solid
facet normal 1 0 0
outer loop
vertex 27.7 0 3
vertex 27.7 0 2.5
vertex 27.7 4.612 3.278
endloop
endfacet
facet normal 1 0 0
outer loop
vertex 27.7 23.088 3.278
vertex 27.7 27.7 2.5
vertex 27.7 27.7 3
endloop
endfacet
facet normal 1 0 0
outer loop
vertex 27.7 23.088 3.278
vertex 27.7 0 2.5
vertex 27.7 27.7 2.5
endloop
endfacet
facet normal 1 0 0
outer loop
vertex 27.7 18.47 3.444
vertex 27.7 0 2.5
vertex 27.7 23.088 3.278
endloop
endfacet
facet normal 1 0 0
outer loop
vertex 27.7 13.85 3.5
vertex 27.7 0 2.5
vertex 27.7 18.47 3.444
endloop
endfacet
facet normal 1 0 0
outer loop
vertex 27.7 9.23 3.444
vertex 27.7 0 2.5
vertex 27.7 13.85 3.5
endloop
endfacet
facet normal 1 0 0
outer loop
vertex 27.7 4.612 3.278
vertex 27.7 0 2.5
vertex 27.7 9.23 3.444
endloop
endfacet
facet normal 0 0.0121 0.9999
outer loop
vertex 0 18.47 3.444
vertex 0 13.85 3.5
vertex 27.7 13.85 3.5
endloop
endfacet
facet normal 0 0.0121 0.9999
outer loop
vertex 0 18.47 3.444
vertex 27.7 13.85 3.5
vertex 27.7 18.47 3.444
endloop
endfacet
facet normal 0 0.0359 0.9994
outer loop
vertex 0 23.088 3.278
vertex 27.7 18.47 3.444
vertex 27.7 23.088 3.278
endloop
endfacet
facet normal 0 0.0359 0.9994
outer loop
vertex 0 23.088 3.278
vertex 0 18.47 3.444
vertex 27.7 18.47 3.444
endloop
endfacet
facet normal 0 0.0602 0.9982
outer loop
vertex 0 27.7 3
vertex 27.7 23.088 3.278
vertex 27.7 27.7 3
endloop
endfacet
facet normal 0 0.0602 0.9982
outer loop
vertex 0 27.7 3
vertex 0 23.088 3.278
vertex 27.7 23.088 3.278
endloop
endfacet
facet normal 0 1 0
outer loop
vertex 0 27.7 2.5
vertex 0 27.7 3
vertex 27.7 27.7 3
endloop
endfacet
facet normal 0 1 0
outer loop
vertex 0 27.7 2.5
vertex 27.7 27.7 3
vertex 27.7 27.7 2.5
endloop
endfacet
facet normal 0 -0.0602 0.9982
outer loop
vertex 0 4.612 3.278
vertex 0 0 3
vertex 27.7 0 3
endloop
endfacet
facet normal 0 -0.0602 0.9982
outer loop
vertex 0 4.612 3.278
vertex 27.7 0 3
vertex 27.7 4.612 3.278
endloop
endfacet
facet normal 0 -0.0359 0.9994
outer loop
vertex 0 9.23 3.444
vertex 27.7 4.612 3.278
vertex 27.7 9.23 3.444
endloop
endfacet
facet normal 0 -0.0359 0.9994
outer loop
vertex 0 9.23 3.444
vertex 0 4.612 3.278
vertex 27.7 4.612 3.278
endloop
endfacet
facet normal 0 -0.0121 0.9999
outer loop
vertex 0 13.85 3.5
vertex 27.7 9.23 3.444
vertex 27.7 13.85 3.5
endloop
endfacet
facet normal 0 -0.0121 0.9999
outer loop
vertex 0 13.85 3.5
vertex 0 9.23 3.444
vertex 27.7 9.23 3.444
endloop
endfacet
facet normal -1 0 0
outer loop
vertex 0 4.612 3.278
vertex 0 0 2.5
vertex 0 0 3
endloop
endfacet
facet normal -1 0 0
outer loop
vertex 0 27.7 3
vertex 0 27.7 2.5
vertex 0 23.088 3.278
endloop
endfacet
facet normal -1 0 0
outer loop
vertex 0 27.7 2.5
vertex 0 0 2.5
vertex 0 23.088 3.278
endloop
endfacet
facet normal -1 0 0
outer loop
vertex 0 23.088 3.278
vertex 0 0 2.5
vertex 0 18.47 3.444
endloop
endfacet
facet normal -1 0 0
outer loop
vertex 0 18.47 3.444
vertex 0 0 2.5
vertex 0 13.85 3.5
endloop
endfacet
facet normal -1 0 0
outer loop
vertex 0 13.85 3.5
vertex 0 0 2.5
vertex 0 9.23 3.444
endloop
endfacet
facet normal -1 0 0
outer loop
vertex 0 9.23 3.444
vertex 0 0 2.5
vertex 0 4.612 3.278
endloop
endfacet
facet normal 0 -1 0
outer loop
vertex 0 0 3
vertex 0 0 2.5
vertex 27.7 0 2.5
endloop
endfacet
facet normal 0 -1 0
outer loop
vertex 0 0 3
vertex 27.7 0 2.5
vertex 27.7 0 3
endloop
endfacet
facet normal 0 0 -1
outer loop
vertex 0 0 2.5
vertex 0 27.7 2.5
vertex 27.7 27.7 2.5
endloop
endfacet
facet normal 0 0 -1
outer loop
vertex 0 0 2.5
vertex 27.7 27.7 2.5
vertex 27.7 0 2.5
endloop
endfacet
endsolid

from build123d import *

# Parameters (mm, degrees)
BOSS_EXTRUDE7_DEPTH = 27.7


with BuildPart() as part:
    # Sketch14 → Boss-Extrude7 (new body)
    with BuildSketch(Plane(origin=(0, 0, 0), x_dir=(0, 0, -1), z_dir=(1, 0, 0))):
        with BuildLine():
            Line((-2.5, 27.7), (-2.5, 0))
            Line((-2.5, 0), (-3, 0))
            ThreePointArc((-3, 0), (-3.374959299, 6.920488834), (-3.5, 13.85))
            ThreePointArc((-3.5, 13.85), (-3.374959299, 20.779511166), (-3, 27.7))
            Line((-3, 27.7), (-2.5, 27.7))
        make_face()
    extrude(amount=BOSS_EXTRUDE7_DEPTH)


solid = part.part
